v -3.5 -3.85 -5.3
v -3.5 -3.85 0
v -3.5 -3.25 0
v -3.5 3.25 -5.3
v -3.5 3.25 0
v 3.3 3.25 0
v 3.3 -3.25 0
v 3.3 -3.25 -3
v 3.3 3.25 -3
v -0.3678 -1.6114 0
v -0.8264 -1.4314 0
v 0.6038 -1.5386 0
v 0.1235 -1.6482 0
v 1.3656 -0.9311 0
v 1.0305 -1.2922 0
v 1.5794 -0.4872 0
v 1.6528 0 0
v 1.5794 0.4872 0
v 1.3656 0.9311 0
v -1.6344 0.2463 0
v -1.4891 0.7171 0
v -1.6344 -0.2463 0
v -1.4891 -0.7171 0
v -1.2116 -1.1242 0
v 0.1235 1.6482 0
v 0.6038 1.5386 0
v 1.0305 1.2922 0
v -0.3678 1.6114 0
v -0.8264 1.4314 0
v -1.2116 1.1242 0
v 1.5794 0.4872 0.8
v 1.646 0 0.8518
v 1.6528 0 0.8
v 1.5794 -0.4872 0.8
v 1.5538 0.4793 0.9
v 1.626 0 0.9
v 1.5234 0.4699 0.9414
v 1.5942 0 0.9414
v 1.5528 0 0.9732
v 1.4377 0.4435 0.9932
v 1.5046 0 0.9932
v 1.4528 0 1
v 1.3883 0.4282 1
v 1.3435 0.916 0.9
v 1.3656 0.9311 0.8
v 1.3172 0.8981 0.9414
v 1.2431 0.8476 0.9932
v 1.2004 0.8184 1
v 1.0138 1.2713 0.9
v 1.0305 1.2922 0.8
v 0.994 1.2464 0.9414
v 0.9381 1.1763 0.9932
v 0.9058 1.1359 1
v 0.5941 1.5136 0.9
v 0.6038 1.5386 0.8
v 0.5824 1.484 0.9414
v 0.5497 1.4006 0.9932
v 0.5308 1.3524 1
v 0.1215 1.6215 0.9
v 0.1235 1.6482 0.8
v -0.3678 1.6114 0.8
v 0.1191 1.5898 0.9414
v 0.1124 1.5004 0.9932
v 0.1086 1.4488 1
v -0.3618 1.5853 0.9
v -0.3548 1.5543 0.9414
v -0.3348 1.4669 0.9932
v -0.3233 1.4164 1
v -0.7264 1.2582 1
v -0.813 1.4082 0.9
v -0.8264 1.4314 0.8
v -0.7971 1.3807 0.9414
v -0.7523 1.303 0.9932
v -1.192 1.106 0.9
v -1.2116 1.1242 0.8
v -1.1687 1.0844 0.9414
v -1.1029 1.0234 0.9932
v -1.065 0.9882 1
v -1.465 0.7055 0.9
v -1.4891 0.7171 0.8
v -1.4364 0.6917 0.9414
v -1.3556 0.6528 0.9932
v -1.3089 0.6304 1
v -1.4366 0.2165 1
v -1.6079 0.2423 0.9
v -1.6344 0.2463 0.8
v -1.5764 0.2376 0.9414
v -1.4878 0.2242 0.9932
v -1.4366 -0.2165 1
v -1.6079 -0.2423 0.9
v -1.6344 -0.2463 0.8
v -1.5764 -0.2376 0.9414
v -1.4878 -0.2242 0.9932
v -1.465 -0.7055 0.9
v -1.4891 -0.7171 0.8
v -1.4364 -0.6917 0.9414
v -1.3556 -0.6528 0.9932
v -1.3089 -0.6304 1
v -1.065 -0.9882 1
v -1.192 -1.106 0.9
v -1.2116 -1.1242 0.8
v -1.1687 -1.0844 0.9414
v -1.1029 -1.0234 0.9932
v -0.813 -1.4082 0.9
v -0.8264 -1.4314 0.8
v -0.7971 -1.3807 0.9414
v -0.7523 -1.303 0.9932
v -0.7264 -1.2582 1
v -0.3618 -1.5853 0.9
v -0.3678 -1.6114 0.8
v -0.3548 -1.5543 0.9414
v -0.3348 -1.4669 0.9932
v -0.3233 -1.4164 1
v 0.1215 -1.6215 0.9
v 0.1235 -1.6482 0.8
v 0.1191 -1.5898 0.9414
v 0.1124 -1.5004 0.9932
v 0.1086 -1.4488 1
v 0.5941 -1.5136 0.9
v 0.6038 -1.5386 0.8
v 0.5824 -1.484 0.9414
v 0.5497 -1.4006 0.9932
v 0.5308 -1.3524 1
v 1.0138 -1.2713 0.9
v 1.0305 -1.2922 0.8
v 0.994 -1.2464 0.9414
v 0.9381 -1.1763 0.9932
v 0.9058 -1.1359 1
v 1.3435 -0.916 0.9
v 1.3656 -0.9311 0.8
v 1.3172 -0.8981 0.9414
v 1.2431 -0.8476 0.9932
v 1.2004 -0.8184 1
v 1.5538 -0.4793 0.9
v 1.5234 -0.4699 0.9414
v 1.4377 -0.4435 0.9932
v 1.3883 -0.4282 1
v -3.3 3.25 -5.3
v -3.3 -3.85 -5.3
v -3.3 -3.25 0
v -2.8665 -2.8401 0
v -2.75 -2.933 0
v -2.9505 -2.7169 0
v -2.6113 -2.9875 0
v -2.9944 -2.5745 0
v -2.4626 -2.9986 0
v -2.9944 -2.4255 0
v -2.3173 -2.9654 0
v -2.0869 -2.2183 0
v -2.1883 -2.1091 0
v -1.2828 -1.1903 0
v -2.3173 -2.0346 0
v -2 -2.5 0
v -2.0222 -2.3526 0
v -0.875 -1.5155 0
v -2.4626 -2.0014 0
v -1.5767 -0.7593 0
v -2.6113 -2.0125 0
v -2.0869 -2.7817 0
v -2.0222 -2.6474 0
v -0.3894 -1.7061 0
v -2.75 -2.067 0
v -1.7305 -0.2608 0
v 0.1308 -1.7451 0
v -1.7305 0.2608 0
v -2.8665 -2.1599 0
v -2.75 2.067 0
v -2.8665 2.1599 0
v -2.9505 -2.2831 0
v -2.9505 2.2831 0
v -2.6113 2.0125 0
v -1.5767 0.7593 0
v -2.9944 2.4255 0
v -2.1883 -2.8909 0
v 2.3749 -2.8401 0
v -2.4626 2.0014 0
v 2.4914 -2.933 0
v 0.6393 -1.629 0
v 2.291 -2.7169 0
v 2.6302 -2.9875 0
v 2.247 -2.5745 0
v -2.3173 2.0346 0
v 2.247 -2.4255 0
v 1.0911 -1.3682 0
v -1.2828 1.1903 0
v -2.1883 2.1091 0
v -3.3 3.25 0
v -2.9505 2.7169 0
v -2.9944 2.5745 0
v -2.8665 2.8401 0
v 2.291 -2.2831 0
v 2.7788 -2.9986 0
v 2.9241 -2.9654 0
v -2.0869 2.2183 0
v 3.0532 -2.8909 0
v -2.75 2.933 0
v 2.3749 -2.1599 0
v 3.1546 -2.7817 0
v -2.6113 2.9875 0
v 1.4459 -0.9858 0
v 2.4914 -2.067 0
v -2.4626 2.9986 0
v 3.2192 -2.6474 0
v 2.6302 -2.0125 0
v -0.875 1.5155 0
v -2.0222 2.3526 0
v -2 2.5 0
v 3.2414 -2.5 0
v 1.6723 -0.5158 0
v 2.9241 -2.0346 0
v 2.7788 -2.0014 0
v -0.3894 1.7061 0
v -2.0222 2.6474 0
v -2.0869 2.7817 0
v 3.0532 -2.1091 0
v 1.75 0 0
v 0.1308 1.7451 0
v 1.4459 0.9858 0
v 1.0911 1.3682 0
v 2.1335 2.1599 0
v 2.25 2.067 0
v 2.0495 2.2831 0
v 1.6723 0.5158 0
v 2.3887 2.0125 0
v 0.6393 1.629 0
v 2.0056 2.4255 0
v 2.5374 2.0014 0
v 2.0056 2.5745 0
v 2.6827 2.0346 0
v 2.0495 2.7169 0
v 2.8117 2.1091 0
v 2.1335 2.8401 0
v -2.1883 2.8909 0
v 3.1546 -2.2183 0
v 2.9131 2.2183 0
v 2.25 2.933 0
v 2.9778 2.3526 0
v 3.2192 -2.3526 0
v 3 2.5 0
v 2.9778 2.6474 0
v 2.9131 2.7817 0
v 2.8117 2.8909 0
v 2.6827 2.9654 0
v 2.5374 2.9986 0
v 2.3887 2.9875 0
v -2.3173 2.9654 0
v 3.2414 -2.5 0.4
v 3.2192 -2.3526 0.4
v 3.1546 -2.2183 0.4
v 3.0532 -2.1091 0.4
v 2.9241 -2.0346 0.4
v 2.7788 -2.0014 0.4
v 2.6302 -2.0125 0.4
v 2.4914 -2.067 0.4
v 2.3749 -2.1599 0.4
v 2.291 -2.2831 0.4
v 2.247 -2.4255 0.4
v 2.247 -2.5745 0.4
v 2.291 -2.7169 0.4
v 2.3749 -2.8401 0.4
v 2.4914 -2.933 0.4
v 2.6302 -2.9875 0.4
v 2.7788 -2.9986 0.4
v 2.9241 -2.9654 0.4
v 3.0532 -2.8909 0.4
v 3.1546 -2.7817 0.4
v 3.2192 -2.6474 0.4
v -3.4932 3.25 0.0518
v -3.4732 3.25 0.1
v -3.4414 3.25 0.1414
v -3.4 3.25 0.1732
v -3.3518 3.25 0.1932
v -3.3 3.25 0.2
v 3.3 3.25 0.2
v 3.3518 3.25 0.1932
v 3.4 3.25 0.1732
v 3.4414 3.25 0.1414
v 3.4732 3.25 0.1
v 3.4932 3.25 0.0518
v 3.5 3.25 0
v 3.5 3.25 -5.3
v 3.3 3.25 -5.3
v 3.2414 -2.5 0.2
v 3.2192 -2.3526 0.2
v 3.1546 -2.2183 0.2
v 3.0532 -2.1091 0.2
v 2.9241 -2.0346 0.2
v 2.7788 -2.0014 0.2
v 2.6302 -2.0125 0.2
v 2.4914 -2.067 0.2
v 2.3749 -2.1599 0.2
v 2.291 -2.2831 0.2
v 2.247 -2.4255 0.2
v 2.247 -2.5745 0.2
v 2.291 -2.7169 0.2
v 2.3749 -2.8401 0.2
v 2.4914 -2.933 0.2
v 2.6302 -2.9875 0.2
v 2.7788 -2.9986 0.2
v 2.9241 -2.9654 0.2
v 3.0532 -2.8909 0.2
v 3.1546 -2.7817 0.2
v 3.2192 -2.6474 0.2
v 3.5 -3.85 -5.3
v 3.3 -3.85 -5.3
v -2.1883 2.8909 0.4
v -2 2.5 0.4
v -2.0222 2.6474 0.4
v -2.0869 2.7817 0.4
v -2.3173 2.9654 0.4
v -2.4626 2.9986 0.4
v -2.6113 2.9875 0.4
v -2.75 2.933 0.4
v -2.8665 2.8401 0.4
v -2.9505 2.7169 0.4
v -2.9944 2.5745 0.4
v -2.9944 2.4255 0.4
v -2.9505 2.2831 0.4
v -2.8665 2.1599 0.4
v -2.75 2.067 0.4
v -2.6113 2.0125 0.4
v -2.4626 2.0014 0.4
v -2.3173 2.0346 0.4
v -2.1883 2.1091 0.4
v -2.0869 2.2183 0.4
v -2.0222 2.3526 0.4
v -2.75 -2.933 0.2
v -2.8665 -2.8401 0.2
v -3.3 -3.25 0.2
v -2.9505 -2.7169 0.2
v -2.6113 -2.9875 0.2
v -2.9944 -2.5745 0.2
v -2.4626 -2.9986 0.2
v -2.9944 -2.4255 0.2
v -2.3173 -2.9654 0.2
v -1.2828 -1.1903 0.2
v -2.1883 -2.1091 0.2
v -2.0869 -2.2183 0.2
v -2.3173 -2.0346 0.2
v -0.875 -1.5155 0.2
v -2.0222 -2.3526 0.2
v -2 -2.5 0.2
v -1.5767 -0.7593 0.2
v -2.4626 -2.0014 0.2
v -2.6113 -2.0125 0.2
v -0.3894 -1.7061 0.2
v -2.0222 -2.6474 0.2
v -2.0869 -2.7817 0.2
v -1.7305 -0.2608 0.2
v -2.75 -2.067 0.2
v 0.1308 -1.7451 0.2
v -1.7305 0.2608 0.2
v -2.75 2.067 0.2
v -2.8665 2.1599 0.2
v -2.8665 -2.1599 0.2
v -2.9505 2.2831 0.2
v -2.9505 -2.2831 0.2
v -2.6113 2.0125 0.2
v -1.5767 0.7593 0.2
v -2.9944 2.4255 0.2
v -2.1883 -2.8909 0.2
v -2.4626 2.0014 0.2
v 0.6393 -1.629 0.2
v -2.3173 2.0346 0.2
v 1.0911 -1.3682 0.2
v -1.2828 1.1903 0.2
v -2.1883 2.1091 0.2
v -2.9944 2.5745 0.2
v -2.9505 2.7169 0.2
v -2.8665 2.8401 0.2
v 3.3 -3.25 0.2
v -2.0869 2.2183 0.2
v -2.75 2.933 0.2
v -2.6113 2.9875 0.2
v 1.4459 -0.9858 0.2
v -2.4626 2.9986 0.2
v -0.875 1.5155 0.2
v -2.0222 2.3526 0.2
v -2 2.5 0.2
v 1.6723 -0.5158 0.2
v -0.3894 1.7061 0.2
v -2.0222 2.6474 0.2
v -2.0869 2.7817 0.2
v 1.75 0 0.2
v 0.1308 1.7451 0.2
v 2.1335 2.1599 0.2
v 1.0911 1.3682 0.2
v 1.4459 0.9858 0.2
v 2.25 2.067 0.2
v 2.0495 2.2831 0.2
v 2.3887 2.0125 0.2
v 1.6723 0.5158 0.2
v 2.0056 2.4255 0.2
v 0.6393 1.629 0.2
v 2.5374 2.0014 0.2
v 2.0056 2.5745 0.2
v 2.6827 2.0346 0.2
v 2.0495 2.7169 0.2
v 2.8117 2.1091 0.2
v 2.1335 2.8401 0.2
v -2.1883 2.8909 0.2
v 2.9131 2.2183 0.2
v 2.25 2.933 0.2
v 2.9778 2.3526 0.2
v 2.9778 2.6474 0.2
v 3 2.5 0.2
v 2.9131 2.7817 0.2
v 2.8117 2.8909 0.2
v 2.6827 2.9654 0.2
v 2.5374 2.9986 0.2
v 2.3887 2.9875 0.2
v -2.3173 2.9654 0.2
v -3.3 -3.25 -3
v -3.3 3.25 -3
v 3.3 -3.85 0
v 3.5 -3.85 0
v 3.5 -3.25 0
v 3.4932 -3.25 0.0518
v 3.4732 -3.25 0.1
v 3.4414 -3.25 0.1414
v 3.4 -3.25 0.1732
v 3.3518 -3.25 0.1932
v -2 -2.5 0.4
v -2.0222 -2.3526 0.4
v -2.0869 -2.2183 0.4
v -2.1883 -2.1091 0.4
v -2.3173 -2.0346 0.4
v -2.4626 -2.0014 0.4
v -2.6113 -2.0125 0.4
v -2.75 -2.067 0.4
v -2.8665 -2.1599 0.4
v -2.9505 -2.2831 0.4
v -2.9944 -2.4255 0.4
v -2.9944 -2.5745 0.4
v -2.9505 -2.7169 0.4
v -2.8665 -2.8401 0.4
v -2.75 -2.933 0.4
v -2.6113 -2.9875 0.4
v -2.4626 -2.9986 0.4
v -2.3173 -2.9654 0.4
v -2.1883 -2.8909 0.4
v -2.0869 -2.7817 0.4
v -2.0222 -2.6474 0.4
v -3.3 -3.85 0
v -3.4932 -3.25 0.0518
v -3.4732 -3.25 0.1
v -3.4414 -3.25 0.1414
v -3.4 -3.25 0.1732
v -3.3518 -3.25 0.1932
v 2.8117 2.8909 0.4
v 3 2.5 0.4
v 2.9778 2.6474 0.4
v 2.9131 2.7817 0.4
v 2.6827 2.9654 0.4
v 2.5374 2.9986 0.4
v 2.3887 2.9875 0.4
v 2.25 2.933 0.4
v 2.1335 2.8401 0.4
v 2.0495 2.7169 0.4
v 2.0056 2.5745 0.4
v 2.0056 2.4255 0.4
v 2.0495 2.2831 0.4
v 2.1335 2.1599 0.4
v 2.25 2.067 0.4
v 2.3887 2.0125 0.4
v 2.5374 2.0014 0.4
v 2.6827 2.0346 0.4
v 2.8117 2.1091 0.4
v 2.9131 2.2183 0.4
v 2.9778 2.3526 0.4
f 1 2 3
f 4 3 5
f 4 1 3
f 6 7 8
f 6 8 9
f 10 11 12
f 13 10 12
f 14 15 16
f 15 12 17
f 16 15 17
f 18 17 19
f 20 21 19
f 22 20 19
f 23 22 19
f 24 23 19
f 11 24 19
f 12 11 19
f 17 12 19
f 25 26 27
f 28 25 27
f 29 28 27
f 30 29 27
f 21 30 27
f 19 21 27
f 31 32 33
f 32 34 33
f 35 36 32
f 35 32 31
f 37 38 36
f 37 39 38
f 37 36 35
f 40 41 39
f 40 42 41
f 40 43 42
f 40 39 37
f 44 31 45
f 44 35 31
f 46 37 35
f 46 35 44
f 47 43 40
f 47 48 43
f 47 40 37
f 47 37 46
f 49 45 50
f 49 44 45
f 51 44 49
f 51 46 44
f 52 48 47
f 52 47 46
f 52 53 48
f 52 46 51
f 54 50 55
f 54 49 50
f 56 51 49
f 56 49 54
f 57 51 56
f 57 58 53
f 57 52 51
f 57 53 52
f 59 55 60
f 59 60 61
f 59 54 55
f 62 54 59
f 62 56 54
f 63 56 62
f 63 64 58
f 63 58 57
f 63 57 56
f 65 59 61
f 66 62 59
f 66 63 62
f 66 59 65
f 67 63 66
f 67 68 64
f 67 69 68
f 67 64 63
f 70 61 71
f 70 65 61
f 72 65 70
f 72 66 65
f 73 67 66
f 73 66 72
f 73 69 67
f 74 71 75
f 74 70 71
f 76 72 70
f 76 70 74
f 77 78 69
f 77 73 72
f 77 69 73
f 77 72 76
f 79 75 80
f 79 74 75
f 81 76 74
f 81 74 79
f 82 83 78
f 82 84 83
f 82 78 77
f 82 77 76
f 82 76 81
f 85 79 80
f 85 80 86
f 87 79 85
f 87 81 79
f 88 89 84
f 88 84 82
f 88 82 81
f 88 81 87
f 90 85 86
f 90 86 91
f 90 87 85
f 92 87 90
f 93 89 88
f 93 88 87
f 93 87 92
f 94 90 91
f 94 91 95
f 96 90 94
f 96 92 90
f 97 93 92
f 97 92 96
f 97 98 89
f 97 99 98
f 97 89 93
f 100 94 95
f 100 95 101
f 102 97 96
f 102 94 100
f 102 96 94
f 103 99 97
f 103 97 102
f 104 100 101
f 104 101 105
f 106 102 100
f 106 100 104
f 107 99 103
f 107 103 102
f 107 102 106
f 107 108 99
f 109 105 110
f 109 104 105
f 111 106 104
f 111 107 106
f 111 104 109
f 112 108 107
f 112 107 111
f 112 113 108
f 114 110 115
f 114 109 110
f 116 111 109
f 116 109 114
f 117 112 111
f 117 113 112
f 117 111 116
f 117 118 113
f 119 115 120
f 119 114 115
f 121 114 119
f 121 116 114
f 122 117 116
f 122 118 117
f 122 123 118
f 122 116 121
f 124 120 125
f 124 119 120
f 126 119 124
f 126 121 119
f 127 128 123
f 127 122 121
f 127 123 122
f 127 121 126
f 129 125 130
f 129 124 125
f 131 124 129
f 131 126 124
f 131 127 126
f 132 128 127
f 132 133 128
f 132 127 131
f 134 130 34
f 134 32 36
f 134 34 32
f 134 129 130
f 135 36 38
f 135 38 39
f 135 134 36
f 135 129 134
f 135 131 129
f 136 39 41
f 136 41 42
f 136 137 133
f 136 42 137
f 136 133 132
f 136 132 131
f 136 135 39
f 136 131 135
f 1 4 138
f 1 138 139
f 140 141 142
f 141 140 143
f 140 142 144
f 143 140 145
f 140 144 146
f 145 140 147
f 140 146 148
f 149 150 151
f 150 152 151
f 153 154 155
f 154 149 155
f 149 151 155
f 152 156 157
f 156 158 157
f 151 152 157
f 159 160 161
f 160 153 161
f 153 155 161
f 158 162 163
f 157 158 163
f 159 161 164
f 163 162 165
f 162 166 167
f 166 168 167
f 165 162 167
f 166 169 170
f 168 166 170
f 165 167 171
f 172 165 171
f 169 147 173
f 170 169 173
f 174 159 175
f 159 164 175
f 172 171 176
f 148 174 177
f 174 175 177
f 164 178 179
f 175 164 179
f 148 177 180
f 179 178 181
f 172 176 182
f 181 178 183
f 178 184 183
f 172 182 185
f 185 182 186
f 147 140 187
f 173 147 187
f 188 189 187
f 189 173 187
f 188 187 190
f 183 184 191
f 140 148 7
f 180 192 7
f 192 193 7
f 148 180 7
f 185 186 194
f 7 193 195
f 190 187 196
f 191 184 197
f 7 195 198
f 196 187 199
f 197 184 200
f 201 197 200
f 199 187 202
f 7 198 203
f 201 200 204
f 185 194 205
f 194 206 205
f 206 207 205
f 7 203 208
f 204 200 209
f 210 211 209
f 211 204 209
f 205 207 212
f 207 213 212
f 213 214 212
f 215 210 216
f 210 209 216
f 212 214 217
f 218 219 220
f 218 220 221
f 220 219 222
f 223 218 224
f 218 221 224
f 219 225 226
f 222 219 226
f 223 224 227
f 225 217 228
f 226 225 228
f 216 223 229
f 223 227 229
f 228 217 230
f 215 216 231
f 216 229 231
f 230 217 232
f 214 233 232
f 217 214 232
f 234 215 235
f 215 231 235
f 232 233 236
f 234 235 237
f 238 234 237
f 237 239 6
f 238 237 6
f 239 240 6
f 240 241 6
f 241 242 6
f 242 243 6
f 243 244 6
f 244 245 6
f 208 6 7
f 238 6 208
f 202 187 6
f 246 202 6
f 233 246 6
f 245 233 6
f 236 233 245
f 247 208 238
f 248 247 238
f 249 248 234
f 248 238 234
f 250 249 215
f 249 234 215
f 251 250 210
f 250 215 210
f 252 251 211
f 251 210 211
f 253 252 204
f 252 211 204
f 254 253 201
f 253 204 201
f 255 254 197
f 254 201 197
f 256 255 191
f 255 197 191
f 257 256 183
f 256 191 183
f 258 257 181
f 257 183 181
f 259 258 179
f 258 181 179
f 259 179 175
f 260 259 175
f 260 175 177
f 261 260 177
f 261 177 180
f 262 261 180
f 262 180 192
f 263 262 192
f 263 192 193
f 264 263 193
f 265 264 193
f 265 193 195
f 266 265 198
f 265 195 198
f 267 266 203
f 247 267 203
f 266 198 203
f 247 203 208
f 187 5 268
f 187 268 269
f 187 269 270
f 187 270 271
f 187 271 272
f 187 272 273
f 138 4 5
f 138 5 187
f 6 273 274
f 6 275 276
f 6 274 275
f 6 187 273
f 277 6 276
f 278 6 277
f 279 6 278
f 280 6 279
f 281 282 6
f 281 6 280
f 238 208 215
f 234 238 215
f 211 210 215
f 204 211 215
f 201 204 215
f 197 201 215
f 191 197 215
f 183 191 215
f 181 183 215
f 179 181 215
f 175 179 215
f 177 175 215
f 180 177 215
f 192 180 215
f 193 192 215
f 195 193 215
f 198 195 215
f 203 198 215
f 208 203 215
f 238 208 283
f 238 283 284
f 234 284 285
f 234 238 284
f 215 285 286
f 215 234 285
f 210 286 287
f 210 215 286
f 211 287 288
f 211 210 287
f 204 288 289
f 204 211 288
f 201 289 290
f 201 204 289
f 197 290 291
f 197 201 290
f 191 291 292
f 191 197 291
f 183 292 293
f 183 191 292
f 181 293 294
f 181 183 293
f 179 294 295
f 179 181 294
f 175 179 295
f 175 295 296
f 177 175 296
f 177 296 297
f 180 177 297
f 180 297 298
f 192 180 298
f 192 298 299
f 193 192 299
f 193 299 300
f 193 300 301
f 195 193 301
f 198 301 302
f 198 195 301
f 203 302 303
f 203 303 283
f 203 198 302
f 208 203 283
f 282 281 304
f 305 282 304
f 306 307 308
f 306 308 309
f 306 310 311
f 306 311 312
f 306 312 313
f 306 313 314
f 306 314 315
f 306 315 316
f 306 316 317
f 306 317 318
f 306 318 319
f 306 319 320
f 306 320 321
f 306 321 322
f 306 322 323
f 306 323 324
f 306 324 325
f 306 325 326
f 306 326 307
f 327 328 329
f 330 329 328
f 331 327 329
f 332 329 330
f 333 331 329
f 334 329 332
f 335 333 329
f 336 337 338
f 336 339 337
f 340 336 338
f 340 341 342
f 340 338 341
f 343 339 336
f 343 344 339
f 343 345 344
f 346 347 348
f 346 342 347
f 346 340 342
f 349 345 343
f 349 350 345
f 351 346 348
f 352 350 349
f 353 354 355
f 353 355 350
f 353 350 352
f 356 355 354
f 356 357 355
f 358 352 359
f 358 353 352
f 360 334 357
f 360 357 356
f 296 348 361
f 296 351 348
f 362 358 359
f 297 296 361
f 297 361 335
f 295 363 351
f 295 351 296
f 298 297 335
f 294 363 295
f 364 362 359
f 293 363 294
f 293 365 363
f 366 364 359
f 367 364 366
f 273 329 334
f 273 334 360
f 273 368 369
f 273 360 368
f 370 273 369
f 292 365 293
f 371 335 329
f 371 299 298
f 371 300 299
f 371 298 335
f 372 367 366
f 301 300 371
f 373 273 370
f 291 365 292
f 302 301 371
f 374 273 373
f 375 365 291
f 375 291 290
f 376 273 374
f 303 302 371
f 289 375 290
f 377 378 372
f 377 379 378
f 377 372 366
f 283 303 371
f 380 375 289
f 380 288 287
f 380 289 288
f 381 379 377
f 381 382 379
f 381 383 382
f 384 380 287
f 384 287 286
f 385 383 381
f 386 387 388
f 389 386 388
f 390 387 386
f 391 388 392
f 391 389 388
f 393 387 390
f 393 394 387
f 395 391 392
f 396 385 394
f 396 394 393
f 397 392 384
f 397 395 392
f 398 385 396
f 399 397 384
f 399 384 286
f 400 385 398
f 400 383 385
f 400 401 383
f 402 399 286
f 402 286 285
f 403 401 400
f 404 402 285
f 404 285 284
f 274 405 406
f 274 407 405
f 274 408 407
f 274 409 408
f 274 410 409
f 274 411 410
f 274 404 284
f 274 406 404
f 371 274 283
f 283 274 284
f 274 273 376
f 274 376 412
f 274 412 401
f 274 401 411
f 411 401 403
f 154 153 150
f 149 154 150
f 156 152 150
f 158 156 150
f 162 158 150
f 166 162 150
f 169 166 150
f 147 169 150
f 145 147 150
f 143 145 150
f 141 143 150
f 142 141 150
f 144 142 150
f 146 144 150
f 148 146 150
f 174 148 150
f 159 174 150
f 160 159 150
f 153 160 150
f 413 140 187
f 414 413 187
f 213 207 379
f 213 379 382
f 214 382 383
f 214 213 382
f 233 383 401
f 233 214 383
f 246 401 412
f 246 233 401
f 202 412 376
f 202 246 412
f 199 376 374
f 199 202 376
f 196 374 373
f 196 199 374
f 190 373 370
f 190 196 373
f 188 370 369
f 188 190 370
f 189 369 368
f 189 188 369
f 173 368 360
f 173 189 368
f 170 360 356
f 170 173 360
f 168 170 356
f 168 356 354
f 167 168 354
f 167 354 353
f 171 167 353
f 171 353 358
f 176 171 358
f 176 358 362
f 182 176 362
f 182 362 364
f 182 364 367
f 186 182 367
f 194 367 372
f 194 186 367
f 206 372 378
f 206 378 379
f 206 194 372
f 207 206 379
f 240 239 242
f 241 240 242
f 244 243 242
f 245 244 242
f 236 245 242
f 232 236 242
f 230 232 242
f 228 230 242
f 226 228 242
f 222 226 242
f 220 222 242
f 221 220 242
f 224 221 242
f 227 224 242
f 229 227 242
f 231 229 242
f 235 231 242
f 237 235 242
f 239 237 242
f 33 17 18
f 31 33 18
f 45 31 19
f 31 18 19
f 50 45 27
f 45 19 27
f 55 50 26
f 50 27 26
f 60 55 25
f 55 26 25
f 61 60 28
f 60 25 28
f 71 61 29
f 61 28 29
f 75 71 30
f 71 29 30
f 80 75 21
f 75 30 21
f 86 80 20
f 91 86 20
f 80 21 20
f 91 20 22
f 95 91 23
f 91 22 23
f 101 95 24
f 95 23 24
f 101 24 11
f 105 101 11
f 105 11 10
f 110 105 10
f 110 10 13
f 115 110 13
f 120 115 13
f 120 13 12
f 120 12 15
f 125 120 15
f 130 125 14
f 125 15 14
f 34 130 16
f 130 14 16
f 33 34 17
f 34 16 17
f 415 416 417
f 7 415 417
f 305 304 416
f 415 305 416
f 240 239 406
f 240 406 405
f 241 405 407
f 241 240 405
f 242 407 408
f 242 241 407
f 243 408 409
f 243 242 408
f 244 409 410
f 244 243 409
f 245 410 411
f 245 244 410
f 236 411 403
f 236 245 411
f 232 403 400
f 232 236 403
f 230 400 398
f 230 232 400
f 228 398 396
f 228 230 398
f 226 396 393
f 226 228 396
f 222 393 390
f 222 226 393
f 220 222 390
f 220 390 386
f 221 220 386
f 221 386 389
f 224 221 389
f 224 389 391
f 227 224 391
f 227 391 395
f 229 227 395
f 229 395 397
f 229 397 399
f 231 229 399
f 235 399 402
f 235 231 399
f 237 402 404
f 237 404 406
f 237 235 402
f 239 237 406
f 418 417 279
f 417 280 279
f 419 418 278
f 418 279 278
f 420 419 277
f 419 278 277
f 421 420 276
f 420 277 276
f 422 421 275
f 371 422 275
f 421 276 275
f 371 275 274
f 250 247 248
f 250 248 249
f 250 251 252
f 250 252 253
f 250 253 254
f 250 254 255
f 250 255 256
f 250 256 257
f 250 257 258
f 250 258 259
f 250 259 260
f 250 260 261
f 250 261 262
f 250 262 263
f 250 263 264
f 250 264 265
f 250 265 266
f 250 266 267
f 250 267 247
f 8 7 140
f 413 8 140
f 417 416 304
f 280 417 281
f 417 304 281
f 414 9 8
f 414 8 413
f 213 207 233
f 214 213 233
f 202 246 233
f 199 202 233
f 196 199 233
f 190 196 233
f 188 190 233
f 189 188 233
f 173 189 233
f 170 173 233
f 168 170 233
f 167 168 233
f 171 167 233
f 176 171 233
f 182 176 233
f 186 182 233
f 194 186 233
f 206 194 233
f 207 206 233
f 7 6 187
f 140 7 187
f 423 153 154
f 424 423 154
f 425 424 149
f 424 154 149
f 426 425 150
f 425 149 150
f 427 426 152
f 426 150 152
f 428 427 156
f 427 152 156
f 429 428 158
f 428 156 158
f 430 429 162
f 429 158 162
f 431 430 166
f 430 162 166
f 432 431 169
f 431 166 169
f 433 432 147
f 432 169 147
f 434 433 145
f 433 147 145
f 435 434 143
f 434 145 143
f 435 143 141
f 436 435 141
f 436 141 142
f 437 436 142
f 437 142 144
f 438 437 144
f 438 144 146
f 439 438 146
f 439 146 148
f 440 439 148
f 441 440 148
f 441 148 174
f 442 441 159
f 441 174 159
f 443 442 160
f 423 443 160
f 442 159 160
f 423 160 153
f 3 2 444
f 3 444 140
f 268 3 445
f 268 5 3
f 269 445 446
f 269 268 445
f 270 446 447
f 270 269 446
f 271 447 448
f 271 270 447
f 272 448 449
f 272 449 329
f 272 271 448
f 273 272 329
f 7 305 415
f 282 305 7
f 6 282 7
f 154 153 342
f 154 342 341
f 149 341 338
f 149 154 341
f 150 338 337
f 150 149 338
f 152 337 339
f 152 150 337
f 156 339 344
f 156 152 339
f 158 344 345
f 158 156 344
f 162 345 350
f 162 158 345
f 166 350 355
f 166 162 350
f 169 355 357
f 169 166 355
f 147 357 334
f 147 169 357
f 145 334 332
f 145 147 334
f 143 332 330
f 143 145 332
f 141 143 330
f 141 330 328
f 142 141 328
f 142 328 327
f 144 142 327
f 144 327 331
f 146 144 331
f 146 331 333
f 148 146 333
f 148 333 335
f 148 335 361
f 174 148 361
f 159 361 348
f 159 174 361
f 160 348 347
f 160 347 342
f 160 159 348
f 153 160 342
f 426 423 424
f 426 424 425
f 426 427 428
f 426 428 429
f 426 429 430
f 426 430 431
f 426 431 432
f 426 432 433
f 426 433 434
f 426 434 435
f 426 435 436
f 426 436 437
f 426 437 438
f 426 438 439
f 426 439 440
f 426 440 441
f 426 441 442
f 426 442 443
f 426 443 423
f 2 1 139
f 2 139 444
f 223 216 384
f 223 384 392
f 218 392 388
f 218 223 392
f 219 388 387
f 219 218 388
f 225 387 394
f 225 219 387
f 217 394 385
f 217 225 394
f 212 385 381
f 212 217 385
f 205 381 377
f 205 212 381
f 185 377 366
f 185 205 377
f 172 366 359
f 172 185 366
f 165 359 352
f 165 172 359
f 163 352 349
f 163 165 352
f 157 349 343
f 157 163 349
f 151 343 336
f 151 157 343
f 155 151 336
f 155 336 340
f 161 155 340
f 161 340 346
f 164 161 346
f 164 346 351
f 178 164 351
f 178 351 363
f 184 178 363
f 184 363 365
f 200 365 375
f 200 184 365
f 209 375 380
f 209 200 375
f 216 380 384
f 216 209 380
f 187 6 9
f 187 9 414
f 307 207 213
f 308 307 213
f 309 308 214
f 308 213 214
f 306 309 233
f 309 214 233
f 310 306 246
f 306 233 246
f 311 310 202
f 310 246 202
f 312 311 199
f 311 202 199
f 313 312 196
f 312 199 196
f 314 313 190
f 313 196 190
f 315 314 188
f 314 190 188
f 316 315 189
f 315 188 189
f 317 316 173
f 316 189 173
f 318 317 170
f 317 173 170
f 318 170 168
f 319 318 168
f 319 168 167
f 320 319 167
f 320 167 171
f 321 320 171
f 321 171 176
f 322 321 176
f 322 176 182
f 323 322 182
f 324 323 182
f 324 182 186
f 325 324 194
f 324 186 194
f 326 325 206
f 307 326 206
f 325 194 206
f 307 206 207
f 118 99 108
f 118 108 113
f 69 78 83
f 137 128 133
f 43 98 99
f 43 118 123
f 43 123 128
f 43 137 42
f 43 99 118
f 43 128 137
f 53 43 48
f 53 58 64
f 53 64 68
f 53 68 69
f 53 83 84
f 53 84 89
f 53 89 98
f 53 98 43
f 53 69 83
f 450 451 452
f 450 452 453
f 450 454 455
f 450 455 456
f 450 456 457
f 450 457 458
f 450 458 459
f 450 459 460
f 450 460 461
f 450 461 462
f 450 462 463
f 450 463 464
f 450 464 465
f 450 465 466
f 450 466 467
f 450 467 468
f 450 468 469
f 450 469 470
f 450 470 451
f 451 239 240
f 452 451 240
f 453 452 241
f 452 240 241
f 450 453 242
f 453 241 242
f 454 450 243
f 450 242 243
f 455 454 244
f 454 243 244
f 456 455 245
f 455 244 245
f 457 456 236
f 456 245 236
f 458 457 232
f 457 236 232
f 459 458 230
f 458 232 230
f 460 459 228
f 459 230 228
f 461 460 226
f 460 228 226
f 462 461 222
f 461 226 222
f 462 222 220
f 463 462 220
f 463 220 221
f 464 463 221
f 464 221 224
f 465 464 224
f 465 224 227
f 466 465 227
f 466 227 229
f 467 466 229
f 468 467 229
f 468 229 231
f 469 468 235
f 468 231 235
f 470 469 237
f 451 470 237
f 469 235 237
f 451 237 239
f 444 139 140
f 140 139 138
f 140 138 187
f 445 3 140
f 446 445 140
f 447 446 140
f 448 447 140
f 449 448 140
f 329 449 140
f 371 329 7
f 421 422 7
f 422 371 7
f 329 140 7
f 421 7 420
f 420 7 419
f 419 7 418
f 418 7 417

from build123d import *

# Parameters (mm, degrees)
CROQUIS1_W       = 7
CROQUIS1_H       = 6.5
CROQUIS1_R       = 1.75
CROQUIS1_R_2     = 0.5
EXTRUIR1_DEPTH   = 0.2
EXTRUIR2_DEPTH   = 0.2
REDONDEO1_R      = 0.2
CROQUIS3_W       = 6.6
CROQUIS3_H       = 6.5
EXTRUIR3_DEPTH   = 3
CROQUIS4_R       = 1.652823383
EXTRUIR5_DEPTH   = 1
CROQUIS5_R       = 0.5
EXTRUIR6_DEPTH   = 0.4
EXTRUIR6_2_DEPTH = 0.4
EXTRUIR6_3_DEPTH = 0.4
EXTRUIR6_4_DEPTH = 0.4
REDONDEO2_R      = 0.2


with BuildPart() as part:
    # Croquis1 → Extruir1 (new body)
    with BuildSketch(Plane.XY):
        Rectangle(CROQUIS1_W, CROQUIS1_H)
        Circle(CROQUIS1_R, mode=Mode.SUBTRACT)
        with Locations((2.5, 2.5)):
            Circle(CROQUIS1_R_2, mode=Mode.SUBTRACT)
        with Locations((2.741434569, -2.5)):
            Circle(CROQUIS1_R_2, mode=Mode.SUBTRACT)
        with Locations((-2.5, -2.5)):
            Circle(CROQUIS1_R_2, mode=Mode.SUBTRACT)
        with Locations((-2.5, 2.5)):
            Circle(CROQUIS1_R_2, mode=Mode.SUBTRACT)
    extrude(amount=EXTRUIR1_DEPTH)

    # Croquis2 → Extruir2 (add)
    with BuildSketch(Plane(origin=(3.5, 0, 0), x_dir=(0, 0, -1), z_dir=(1, 0, 0))):
        Polygon((-0.2, 3.25), (5.3, 3.25), (5.3, -3.85), (0, -3.85), (0, -3.25), (-0.2, -3.25), align=None)
    extruir2 = extrude(amount=-EXTRUIR2_DEPTH)

    # Simetría1: Extruir2 across plane
    add(extruir2.mirror(Plane(origin=(0, 0, 0), x_dir=(0, 0, 1), z_dir=(1, 0, 0))))

    # Redondeo1
    redondeo1_edges = [part.edges().sort_by_distance(p)[0] for p in [
        (-3.5, 0, 0.2),
        (3.5, 0, 0.2),
    ]]
    fillet(redondeo1_edges, radius=REDONDEO1_R)


with BuildPart() as body_2:
    # Croquis3 → Extruir3 (new body)
    with BuildSketch(Plane(origin=(0, 0, 0), x_dir=(-1, 0, 0), z_dir=(0, 0, -1))):
        Rectangle(CROQUIS3_W, CROQUIS3_H)
    extrude(amount=EXTRUIR3_DEPTH)


with BuildPart() as body_3:
    # Croquis4 → Extruir5 (new body)
    with BuildSketch(Plane.XY):
        Circle(CROQUIS4_R)
    extrude(amount=EXTRUIR5_DEPTH)

    # Redondeo2
    redondeo2_edges = [body_3.edges().sort_by_distance(p)[0] for p in [
        (-1.652823383, 0, 1),
    ]]
    fillet(redondeo2_edges, radius=REDONDEO2_R)


with BuildPart() as body_4:
    # Croquis5 → Extruir6 (new body)
    with BuildSketch(Plane.XY):
        with Locations((2.5, 2.5)):
            Circle(CROQUIS5_R)
    extrude(amount=EXTRUIR6_DEPTH)


with BuildPart() as body_5:
    # Croquis5 → Extruir6 2 (new body)
    with BuildSketch(Plane.XY):
        with Locations((-2.5, 2.5)):
            Circle(CROQUIS5_R)
    extrude(amount=EXTRUIR6_2_DEPTH)


with BuildPart() as body_6:
    # Croquis5 → Extruir6 3 (new body)
    with BuildSketch(Plane.XY):
        with Locations((-2.5, -2.5)):
            Circle(CROQUIS5_R)
    extrude(amount=EXTRUIR6_3_DEPTH)


with BuildPart() as body_7:
    # Croquis5 → Extruir6 4 (new body)
    with BuildSketch(Plane.XY):
        with Locations((2.741434569, -2.5)):
            Circle(CROQUIS5_R)
    extrude(amount=EXTRUIR6_4_DEPTH)


solid = Compound([part.part, body_2.part, body_3.part, body_4.part, body_5.part, body_6.part, body_7.part])
